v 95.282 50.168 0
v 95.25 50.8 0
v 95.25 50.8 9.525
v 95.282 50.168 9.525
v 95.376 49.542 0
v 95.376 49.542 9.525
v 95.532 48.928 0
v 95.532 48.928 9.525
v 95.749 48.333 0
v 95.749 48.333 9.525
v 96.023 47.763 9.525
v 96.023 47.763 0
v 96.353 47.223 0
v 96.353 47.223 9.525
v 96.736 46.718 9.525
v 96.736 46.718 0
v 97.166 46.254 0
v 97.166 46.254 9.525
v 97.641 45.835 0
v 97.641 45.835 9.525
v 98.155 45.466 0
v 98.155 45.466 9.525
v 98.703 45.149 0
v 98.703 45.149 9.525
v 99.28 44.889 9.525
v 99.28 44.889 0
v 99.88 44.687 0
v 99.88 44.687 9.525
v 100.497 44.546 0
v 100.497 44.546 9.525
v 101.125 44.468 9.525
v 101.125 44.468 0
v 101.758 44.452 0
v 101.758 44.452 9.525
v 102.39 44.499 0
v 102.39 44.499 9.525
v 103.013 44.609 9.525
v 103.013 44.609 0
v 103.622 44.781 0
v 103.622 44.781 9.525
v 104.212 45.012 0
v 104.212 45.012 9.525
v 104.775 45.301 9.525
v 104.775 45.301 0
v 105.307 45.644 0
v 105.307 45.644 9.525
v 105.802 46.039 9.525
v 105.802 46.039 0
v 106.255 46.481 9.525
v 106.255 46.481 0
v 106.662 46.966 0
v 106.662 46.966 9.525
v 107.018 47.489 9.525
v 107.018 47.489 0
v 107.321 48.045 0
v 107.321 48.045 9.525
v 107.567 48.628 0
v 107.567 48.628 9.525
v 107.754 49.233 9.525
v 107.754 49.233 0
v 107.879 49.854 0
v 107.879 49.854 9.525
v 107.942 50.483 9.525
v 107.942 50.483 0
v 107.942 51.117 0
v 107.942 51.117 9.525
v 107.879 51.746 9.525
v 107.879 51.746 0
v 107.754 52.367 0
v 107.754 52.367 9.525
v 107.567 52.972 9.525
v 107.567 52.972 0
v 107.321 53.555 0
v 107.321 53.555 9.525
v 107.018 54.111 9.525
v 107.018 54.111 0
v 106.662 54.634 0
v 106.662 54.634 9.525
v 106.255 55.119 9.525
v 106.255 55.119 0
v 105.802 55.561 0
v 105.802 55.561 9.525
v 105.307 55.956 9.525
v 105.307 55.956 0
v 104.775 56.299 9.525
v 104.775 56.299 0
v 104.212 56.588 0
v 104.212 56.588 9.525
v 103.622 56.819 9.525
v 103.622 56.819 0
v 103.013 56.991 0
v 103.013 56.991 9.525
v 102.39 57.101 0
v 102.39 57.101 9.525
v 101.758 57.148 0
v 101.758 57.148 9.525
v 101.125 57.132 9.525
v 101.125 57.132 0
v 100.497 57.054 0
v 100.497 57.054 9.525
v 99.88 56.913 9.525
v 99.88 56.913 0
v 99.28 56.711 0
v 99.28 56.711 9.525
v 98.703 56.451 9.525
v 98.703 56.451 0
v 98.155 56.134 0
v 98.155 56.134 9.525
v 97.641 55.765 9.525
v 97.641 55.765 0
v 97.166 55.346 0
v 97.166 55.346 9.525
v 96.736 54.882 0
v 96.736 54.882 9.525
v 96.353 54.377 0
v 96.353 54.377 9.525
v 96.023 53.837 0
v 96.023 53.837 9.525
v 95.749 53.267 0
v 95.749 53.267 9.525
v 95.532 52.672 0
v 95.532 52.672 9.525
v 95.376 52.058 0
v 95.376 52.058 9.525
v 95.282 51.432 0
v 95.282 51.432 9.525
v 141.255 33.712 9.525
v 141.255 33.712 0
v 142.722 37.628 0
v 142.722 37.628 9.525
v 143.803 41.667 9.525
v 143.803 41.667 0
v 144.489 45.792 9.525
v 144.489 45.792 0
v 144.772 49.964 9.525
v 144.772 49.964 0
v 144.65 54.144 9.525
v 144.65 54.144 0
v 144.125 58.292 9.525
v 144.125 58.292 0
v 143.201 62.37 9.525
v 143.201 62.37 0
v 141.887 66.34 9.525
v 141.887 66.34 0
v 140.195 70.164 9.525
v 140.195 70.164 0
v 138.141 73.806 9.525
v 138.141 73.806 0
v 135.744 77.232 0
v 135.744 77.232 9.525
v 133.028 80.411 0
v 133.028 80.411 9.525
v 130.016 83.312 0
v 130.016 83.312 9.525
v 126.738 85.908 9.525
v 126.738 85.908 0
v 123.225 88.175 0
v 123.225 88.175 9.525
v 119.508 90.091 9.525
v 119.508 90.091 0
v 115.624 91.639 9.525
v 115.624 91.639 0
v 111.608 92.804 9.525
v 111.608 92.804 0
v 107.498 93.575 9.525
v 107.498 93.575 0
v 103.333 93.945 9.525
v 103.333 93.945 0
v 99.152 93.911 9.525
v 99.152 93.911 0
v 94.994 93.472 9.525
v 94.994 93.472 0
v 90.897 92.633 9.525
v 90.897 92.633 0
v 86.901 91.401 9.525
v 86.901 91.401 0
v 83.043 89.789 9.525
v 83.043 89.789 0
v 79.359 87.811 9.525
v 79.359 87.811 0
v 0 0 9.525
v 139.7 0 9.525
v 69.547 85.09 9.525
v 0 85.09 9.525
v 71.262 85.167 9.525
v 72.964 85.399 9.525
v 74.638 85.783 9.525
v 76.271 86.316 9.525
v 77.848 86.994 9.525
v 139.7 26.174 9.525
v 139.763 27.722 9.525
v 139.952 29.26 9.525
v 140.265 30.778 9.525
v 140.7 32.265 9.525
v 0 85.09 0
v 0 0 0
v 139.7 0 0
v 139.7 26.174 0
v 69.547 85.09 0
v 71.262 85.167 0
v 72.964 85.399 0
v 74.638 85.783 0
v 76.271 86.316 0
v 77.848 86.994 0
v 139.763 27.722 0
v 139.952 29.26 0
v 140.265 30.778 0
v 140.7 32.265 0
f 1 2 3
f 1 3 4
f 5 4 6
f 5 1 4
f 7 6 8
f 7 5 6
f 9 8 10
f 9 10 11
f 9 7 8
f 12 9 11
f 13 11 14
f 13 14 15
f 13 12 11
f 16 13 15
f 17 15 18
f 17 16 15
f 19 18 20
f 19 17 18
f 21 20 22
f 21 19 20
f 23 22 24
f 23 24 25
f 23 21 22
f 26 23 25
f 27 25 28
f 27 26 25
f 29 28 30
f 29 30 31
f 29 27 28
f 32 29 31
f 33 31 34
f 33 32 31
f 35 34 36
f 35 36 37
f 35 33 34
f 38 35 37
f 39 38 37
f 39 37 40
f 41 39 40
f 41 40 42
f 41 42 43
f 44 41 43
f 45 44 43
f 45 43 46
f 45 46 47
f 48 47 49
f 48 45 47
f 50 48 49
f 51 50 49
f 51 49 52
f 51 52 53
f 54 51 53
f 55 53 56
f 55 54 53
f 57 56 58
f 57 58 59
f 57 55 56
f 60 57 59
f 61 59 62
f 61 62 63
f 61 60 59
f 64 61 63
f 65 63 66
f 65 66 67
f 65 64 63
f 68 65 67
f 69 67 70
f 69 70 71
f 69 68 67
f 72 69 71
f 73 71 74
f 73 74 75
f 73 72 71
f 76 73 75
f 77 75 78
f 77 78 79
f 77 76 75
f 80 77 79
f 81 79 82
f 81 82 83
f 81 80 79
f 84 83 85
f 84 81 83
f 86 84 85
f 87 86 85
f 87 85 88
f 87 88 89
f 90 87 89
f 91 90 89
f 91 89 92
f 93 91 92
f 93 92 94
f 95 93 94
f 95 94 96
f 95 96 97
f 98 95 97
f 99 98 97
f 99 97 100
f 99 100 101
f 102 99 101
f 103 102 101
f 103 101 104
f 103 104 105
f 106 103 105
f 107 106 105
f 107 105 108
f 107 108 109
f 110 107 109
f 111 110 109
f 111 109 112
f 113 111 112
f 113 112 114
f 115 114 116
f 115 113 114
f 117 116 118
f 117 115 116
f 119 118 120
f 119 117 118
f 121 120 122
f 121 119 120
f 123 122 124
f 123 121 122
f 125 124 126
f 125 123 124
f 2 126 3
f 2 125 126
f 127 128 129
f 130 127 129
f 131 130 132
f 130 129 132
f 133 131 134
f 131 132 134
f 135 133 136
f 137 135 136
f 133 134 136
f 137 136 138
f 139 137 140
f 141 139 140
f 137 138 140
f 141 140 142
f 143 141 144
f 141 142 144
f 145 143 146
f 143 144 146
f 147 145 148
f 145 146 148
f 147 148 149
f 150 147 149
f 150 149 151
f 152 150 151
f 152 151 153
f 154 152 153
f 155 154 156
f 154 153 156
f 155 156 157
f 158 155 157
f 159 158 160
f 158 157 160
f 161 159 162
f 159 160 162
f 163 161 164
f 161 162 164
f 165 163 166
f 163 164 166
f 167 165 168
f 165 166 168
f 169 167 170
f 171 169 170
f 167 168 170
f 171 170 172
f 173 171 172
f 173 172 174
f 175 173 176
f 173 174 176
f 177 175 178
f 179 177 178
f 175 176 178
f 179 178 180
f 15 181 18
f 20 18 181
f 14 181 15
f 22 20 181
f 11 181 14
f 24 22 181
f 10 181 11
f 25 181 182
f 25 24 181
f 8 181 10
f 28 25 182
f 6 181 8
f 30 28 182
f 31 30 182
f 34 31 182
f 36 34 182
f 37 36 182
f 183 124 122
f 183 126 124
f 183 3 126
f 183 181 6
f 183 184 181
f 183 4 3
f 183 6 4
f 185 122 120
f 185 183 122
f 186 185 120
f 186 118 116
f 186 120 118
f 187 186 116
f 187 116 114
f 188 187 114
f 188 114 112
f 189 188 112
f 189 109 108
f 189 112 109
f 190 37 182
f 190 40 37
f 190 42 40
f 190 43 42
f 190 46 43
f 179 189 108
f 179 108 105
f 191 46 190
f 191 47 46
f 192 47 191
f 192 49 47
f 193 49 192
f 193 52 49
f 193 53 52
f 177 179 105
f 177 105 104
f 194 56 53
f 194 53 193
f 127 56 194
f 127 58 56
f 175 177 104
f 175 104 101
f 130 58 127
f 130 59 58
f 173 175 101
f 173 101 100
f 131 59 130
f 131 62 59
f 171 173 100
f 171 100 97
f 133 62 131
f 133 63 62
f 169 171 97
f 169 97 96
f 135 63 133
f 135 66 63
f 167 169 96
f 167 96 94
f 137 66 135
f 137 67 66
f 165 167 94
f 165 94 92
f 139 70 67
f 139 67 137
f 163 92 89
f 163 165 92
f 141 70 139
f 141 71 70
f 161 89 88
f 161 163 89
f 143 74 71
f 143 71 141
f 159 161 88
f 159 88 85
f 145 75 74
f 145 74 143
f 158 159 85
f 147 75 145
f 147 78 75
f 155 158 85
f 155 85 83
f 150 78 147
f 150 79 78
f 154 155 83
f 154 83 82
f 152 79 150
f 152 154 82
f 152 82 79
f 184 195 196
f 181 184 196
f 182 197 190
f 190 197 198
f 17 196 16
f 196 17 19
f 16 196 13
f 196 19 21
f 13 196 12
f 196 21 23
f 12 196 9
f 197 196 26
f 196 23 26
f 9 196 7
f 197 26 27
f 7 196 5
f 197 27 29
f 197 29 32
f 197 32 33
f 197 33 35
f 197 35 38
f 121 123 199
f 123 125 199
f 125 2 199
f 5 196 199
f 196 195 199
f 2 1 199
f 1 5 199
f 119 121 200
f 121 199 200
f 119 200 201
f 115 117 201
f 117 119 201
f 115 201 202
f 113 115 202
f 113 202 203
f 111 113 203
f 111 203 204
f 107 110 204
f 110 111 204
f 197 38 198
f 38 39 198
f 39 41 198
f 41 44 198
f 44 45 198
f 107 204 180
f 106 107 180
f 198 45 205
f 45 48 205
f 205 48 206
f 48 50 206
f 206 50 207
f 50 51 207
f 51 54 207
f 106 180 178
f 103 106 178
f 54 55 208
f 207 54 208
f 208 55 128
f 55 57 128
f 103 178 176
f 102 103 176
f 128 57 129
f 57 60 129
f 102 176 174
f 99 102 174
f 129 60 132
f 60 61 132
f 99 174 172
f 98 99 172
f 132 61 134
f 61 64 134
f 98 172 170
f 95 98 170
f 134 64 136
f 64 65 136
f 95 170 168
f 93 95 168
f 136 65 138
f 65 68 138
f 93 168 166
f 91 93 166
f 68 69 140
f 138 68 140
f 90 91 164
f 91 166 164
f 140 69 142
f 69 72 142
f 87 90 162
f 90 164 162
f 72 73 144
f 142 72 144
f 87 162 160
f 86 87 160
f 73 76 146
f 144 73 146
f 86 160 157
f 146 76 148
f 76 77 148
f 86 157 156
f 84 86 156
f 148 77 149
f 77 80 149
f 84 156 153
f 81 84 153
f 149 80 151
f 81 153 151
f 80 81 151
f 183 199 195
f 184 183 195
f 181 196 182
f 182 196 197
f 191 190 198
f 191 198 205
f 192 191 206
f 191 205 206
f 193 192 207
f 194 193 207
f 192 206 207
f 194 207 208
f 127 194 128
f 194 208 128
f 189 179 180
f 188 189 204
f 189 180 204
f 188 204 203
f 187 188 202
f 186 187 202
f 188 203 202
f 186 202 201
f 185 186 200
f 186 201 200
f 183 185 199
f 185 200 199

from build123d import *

# Parameters (mm, degrees)
SKETCH1_R      = 6.35
EXTRUDE1_DEPTH = 9.525


with BuildPart() as part:
    # Sketch1 → Extrude1 (new body)
    with BuildSketch(Plane.XY):
        with BuildLine():
            Line((0, 0), (139.7, 0))
            Line((139.7, 0), (139.7, 26.173786324))
            ThreePointArc((139.7, 26.173786324), (140.092825695, 30.022467519), (141.255102041, 33.712423164))
            ThreePointArc((141.255102041, 33.712423164), (130.016323799, 83.311919995), (79.358899418, 87.811428571))
            ThreePointArc((79.358899418, 87.811428571), (74.63797582, 85.782960673), (69.546649161, 85.09))
            Line((69.546649161, 85.09), (0, 85.09))
            Line((0, 85.09), (0, 0))
        make_face()
        with Locations(Location((101.6, 50.8, 0), (0, 0, 180))):
            Circle(SKETCH1_R, mode=Mode.SUBTRACT)
    extrude(amount=EXTRUDE1_DEPTH)


solid = part.part
